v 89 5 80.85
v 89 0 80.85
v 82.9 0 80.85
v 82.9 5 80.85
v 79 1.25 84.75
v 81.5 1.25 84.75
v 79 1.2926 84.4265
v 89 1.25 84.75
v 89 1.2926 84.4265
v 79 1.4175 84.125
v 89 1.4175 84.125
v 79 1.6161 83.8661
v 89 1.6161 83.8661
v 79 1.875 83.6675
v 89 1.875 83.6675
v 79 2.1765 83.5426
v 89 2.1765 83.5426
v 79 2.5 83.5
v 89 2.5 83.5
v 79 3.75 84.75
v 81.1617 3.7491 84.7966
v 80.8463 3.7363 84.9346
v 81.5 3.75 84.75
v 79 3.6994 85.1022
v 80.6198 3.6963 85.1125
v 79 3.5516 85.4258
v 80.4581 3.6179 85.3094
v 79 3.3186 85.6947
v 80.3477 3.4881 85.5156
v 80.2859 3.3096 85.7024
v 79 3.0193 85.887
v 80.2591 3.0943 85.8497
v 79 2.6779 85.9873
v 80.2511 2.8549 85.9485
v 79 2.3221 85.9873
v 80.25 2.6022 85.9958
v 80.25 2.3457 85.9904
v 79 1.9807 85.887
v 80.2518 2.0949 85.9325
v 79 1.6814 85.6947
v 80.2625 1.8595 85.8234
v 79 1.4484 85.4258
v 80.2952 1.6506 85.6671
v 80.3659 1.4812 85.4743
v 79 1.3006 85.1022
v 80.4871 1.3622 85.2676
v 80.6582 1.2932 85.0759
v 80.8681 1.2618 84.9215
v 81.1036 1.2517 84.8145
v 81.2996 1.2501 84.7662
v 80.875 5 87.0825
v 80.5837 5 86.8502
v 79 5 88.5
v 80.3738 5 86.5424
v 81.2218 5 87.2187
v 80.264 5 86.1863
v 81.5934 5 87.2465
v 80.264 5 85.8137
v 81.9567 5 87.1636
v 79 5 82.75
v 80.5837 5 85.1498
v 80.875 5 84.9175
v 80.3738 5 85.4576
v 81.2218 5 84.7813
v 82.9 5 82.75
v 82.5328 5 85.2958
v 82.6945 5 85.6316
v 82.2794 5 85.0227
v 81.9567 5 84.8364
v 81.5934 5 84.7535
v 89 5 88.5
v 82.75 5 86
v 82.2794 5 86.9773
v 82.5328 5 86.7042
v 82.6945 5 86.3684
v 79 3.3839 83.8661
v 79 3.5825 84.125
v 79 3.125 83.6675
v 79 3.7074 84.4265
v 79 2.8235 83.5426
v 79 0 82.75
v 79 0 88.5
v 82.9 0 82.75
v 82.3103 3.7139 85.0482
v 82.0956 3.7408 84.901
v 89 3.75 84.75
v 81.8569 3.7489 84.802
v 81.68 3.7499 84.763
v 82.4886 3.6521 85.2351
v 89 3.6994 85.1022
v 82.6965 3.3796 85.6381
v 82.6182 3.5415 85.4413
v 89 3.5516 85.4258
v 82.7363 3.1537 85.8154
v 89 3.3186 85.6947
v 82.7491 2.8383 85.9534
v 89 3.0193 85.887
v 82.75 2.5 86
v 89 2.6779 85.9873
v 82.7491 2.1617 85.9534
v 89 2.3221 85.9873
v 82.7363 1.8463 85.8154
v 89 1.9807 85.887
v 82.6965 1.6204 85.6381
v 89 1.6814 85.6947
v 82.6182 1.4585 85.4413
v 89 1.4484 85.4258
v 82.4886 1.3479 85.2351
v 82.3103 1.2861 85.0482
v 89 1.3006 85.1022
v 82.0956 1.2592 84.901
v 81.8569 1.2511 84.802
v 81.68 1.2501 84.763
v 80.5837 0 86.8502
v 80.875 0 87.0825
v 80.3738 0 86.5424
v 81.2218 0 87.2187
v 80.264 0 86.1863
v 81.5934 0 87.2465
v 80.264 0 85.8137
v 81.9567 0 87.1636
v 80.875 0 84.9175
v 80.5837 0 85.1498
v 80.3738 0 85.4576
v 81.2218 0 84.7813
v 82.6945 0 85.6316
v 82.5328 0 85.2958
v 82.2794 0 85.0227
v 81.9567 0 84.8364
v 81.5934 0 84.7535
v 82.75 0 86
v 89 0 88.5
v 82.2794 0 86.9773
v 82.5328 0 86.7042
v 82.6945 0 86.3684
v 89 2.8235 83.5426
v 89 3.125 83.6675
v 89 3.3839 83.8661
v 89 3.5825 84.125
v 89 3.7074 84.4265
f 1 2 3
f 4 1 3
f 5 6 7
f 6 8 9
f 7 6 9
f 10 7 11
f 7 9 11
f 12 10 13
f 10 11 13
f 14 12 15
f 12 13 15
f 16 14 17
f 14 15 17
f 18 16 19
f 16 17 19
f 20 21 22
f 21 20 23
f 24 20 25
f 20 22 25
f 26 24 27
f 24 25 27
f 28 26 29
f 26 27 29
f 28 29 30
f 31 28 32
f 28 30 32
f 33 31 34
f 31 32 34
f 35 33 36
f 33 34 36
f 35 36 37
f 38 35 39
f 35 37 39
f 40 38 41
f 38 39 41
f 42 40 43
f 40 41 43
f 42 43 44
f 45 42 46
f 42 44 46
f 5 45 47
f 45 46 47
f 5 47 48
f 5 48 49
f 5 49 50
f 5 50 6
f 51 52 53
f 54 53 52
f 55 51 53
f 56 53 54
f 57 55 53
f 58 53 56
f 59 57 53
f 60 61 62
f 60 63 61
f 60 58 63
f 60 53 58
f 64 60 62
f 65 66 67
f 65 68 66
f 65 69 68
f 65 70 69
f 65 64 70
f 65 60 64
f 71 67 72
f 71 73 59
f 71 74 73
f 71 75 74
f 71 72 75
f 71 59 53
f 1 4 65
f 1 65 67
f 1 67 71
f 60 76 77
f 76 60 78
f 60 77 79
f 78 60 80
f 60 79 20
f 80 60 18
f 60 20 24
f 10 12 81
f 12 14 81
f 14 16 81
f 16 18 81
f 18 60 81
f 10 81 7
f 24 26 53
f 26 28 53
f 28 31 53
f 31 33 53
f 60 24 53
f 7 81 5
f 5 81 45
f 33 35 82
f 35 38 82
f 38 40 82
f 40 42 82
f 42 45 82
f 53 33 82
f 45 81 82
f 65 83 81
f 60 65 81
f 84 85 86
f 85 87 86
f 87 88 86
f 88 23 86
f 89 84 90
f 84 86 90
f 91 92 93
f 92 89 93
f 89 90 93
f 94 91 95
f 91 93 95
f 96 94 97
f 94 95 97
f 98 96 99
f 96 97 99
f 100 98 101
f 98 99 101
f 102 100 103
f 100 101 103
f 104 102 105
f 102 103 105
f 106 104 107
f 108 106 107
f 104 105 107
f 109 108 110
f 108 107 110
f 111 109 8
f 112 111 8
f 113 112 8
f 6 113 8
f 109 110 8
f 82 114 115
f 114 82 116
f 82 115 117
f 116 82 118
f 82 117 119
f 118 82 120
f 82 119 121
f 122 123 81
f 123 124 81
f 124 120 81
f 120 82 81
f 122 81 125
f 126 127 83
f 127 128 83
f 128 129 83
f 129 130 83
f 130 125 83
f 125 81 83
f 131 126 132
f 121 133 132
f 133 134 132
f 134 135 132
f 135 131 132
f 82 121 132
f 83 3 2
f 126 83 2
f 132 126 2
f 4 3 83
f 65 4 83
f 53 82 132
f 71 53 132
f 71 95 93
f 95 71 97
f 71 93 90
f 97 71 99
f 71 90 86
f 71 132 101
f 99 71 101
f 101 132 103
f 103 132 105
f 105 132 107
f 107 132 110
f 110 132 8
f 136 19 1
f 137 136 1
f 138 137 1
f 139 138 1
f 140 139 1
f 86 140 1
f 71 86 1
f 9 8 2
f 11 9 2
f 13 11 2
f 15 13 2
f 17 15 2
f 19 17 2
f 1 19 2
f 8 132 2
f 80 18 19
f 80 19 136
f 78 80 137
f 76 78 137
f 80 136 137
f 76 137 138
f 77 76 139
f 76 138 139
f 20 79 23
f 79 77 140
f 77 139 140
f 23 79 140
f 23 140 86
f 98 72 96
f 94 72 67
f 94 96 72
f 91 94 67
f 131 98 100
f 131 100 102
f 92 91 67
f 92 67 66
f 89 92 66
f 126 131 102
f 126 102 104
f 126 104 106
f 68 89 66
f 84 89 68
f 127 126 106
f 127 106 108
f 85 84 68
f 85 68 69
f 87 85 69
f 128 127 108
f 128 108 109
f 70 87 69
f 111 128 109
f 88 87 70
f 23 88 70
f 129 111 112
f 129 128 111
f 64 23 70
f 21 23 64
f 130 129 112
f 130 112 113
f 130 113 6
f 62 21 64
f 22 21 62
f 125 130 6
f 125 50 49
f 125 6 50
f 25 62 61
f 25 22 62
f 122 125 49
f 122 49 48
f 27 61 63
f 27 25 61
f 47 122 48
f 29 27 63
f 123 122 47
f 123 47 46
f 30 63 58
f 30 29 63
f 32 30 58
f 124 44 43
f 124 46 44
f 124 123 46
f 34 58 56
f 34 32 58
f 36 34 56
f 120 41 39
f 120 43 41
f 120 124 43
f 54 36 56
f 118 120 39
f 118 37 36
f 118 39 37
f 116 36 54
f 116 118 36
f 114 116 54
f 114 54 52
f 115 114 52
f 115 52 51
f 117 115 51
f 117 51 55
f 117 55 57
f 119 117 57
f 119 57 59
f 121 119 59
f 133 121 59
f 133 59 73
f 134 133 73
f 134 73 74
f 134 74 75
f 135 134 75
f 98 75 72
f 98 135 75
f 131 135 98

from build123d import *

# Parameters (mm, degrees)
SKETCH4_R           = 1.25
BOSS_EXTRUDE2_DEPTH = 5
CUT_EXTRUDE2_DEPTH  = 10


with BuildPart() as part:
    # Sketch4 → Boss-Extrude2 (new body)
    with BuildSketch(Plane(origin=(0, 0, 0), x_dir=(1, 0, 0), z_dir=(0, 1, 0))):
        Polygon((82.9, -82.75), (79, -82.75), (79, -86), (79, -88.5), (89, -88.5), (89, -80.85), (82.9, -80.85), align=None)
        with Locations((81.5, -86)):
            Circle(SKETCH4_R, mode=Mode.SUBTRACT)
    extrude(amount=BOSS_EXTRUDE2_DEPTH)

    # Sketch5 → Cut-Extrude2 (cut)
    with BuildSketch(Plane(origin=(89, 0, 0), x_dir=(0, 0, -1), z_dir=(1, 0, 0))):
        with BuildLine():
            ThreePointArc((-84.75, 3.75), (-86, 2.5), (-84.75, 1.25))
            Line((-84.75, 1.25), (-84.75, 3.75))
        make_face()
        with BuildLine():
            Line((-84.75, 3.75), (-84.75, 1.25))
            ThreePointArc((-84.75, 1.25), (-83.866116524, 1.616116524), (-83.5, 2.5))
            ThreePointArc((-83.5, 2.5), (-83.866116524, 3.383883476), (-84.75, 3.75))
        make_face()
    extrude(amount=-CUT_EXTRUDE2_DEPTH, mode=Mode.SUBTRACT)


solid = part.part
